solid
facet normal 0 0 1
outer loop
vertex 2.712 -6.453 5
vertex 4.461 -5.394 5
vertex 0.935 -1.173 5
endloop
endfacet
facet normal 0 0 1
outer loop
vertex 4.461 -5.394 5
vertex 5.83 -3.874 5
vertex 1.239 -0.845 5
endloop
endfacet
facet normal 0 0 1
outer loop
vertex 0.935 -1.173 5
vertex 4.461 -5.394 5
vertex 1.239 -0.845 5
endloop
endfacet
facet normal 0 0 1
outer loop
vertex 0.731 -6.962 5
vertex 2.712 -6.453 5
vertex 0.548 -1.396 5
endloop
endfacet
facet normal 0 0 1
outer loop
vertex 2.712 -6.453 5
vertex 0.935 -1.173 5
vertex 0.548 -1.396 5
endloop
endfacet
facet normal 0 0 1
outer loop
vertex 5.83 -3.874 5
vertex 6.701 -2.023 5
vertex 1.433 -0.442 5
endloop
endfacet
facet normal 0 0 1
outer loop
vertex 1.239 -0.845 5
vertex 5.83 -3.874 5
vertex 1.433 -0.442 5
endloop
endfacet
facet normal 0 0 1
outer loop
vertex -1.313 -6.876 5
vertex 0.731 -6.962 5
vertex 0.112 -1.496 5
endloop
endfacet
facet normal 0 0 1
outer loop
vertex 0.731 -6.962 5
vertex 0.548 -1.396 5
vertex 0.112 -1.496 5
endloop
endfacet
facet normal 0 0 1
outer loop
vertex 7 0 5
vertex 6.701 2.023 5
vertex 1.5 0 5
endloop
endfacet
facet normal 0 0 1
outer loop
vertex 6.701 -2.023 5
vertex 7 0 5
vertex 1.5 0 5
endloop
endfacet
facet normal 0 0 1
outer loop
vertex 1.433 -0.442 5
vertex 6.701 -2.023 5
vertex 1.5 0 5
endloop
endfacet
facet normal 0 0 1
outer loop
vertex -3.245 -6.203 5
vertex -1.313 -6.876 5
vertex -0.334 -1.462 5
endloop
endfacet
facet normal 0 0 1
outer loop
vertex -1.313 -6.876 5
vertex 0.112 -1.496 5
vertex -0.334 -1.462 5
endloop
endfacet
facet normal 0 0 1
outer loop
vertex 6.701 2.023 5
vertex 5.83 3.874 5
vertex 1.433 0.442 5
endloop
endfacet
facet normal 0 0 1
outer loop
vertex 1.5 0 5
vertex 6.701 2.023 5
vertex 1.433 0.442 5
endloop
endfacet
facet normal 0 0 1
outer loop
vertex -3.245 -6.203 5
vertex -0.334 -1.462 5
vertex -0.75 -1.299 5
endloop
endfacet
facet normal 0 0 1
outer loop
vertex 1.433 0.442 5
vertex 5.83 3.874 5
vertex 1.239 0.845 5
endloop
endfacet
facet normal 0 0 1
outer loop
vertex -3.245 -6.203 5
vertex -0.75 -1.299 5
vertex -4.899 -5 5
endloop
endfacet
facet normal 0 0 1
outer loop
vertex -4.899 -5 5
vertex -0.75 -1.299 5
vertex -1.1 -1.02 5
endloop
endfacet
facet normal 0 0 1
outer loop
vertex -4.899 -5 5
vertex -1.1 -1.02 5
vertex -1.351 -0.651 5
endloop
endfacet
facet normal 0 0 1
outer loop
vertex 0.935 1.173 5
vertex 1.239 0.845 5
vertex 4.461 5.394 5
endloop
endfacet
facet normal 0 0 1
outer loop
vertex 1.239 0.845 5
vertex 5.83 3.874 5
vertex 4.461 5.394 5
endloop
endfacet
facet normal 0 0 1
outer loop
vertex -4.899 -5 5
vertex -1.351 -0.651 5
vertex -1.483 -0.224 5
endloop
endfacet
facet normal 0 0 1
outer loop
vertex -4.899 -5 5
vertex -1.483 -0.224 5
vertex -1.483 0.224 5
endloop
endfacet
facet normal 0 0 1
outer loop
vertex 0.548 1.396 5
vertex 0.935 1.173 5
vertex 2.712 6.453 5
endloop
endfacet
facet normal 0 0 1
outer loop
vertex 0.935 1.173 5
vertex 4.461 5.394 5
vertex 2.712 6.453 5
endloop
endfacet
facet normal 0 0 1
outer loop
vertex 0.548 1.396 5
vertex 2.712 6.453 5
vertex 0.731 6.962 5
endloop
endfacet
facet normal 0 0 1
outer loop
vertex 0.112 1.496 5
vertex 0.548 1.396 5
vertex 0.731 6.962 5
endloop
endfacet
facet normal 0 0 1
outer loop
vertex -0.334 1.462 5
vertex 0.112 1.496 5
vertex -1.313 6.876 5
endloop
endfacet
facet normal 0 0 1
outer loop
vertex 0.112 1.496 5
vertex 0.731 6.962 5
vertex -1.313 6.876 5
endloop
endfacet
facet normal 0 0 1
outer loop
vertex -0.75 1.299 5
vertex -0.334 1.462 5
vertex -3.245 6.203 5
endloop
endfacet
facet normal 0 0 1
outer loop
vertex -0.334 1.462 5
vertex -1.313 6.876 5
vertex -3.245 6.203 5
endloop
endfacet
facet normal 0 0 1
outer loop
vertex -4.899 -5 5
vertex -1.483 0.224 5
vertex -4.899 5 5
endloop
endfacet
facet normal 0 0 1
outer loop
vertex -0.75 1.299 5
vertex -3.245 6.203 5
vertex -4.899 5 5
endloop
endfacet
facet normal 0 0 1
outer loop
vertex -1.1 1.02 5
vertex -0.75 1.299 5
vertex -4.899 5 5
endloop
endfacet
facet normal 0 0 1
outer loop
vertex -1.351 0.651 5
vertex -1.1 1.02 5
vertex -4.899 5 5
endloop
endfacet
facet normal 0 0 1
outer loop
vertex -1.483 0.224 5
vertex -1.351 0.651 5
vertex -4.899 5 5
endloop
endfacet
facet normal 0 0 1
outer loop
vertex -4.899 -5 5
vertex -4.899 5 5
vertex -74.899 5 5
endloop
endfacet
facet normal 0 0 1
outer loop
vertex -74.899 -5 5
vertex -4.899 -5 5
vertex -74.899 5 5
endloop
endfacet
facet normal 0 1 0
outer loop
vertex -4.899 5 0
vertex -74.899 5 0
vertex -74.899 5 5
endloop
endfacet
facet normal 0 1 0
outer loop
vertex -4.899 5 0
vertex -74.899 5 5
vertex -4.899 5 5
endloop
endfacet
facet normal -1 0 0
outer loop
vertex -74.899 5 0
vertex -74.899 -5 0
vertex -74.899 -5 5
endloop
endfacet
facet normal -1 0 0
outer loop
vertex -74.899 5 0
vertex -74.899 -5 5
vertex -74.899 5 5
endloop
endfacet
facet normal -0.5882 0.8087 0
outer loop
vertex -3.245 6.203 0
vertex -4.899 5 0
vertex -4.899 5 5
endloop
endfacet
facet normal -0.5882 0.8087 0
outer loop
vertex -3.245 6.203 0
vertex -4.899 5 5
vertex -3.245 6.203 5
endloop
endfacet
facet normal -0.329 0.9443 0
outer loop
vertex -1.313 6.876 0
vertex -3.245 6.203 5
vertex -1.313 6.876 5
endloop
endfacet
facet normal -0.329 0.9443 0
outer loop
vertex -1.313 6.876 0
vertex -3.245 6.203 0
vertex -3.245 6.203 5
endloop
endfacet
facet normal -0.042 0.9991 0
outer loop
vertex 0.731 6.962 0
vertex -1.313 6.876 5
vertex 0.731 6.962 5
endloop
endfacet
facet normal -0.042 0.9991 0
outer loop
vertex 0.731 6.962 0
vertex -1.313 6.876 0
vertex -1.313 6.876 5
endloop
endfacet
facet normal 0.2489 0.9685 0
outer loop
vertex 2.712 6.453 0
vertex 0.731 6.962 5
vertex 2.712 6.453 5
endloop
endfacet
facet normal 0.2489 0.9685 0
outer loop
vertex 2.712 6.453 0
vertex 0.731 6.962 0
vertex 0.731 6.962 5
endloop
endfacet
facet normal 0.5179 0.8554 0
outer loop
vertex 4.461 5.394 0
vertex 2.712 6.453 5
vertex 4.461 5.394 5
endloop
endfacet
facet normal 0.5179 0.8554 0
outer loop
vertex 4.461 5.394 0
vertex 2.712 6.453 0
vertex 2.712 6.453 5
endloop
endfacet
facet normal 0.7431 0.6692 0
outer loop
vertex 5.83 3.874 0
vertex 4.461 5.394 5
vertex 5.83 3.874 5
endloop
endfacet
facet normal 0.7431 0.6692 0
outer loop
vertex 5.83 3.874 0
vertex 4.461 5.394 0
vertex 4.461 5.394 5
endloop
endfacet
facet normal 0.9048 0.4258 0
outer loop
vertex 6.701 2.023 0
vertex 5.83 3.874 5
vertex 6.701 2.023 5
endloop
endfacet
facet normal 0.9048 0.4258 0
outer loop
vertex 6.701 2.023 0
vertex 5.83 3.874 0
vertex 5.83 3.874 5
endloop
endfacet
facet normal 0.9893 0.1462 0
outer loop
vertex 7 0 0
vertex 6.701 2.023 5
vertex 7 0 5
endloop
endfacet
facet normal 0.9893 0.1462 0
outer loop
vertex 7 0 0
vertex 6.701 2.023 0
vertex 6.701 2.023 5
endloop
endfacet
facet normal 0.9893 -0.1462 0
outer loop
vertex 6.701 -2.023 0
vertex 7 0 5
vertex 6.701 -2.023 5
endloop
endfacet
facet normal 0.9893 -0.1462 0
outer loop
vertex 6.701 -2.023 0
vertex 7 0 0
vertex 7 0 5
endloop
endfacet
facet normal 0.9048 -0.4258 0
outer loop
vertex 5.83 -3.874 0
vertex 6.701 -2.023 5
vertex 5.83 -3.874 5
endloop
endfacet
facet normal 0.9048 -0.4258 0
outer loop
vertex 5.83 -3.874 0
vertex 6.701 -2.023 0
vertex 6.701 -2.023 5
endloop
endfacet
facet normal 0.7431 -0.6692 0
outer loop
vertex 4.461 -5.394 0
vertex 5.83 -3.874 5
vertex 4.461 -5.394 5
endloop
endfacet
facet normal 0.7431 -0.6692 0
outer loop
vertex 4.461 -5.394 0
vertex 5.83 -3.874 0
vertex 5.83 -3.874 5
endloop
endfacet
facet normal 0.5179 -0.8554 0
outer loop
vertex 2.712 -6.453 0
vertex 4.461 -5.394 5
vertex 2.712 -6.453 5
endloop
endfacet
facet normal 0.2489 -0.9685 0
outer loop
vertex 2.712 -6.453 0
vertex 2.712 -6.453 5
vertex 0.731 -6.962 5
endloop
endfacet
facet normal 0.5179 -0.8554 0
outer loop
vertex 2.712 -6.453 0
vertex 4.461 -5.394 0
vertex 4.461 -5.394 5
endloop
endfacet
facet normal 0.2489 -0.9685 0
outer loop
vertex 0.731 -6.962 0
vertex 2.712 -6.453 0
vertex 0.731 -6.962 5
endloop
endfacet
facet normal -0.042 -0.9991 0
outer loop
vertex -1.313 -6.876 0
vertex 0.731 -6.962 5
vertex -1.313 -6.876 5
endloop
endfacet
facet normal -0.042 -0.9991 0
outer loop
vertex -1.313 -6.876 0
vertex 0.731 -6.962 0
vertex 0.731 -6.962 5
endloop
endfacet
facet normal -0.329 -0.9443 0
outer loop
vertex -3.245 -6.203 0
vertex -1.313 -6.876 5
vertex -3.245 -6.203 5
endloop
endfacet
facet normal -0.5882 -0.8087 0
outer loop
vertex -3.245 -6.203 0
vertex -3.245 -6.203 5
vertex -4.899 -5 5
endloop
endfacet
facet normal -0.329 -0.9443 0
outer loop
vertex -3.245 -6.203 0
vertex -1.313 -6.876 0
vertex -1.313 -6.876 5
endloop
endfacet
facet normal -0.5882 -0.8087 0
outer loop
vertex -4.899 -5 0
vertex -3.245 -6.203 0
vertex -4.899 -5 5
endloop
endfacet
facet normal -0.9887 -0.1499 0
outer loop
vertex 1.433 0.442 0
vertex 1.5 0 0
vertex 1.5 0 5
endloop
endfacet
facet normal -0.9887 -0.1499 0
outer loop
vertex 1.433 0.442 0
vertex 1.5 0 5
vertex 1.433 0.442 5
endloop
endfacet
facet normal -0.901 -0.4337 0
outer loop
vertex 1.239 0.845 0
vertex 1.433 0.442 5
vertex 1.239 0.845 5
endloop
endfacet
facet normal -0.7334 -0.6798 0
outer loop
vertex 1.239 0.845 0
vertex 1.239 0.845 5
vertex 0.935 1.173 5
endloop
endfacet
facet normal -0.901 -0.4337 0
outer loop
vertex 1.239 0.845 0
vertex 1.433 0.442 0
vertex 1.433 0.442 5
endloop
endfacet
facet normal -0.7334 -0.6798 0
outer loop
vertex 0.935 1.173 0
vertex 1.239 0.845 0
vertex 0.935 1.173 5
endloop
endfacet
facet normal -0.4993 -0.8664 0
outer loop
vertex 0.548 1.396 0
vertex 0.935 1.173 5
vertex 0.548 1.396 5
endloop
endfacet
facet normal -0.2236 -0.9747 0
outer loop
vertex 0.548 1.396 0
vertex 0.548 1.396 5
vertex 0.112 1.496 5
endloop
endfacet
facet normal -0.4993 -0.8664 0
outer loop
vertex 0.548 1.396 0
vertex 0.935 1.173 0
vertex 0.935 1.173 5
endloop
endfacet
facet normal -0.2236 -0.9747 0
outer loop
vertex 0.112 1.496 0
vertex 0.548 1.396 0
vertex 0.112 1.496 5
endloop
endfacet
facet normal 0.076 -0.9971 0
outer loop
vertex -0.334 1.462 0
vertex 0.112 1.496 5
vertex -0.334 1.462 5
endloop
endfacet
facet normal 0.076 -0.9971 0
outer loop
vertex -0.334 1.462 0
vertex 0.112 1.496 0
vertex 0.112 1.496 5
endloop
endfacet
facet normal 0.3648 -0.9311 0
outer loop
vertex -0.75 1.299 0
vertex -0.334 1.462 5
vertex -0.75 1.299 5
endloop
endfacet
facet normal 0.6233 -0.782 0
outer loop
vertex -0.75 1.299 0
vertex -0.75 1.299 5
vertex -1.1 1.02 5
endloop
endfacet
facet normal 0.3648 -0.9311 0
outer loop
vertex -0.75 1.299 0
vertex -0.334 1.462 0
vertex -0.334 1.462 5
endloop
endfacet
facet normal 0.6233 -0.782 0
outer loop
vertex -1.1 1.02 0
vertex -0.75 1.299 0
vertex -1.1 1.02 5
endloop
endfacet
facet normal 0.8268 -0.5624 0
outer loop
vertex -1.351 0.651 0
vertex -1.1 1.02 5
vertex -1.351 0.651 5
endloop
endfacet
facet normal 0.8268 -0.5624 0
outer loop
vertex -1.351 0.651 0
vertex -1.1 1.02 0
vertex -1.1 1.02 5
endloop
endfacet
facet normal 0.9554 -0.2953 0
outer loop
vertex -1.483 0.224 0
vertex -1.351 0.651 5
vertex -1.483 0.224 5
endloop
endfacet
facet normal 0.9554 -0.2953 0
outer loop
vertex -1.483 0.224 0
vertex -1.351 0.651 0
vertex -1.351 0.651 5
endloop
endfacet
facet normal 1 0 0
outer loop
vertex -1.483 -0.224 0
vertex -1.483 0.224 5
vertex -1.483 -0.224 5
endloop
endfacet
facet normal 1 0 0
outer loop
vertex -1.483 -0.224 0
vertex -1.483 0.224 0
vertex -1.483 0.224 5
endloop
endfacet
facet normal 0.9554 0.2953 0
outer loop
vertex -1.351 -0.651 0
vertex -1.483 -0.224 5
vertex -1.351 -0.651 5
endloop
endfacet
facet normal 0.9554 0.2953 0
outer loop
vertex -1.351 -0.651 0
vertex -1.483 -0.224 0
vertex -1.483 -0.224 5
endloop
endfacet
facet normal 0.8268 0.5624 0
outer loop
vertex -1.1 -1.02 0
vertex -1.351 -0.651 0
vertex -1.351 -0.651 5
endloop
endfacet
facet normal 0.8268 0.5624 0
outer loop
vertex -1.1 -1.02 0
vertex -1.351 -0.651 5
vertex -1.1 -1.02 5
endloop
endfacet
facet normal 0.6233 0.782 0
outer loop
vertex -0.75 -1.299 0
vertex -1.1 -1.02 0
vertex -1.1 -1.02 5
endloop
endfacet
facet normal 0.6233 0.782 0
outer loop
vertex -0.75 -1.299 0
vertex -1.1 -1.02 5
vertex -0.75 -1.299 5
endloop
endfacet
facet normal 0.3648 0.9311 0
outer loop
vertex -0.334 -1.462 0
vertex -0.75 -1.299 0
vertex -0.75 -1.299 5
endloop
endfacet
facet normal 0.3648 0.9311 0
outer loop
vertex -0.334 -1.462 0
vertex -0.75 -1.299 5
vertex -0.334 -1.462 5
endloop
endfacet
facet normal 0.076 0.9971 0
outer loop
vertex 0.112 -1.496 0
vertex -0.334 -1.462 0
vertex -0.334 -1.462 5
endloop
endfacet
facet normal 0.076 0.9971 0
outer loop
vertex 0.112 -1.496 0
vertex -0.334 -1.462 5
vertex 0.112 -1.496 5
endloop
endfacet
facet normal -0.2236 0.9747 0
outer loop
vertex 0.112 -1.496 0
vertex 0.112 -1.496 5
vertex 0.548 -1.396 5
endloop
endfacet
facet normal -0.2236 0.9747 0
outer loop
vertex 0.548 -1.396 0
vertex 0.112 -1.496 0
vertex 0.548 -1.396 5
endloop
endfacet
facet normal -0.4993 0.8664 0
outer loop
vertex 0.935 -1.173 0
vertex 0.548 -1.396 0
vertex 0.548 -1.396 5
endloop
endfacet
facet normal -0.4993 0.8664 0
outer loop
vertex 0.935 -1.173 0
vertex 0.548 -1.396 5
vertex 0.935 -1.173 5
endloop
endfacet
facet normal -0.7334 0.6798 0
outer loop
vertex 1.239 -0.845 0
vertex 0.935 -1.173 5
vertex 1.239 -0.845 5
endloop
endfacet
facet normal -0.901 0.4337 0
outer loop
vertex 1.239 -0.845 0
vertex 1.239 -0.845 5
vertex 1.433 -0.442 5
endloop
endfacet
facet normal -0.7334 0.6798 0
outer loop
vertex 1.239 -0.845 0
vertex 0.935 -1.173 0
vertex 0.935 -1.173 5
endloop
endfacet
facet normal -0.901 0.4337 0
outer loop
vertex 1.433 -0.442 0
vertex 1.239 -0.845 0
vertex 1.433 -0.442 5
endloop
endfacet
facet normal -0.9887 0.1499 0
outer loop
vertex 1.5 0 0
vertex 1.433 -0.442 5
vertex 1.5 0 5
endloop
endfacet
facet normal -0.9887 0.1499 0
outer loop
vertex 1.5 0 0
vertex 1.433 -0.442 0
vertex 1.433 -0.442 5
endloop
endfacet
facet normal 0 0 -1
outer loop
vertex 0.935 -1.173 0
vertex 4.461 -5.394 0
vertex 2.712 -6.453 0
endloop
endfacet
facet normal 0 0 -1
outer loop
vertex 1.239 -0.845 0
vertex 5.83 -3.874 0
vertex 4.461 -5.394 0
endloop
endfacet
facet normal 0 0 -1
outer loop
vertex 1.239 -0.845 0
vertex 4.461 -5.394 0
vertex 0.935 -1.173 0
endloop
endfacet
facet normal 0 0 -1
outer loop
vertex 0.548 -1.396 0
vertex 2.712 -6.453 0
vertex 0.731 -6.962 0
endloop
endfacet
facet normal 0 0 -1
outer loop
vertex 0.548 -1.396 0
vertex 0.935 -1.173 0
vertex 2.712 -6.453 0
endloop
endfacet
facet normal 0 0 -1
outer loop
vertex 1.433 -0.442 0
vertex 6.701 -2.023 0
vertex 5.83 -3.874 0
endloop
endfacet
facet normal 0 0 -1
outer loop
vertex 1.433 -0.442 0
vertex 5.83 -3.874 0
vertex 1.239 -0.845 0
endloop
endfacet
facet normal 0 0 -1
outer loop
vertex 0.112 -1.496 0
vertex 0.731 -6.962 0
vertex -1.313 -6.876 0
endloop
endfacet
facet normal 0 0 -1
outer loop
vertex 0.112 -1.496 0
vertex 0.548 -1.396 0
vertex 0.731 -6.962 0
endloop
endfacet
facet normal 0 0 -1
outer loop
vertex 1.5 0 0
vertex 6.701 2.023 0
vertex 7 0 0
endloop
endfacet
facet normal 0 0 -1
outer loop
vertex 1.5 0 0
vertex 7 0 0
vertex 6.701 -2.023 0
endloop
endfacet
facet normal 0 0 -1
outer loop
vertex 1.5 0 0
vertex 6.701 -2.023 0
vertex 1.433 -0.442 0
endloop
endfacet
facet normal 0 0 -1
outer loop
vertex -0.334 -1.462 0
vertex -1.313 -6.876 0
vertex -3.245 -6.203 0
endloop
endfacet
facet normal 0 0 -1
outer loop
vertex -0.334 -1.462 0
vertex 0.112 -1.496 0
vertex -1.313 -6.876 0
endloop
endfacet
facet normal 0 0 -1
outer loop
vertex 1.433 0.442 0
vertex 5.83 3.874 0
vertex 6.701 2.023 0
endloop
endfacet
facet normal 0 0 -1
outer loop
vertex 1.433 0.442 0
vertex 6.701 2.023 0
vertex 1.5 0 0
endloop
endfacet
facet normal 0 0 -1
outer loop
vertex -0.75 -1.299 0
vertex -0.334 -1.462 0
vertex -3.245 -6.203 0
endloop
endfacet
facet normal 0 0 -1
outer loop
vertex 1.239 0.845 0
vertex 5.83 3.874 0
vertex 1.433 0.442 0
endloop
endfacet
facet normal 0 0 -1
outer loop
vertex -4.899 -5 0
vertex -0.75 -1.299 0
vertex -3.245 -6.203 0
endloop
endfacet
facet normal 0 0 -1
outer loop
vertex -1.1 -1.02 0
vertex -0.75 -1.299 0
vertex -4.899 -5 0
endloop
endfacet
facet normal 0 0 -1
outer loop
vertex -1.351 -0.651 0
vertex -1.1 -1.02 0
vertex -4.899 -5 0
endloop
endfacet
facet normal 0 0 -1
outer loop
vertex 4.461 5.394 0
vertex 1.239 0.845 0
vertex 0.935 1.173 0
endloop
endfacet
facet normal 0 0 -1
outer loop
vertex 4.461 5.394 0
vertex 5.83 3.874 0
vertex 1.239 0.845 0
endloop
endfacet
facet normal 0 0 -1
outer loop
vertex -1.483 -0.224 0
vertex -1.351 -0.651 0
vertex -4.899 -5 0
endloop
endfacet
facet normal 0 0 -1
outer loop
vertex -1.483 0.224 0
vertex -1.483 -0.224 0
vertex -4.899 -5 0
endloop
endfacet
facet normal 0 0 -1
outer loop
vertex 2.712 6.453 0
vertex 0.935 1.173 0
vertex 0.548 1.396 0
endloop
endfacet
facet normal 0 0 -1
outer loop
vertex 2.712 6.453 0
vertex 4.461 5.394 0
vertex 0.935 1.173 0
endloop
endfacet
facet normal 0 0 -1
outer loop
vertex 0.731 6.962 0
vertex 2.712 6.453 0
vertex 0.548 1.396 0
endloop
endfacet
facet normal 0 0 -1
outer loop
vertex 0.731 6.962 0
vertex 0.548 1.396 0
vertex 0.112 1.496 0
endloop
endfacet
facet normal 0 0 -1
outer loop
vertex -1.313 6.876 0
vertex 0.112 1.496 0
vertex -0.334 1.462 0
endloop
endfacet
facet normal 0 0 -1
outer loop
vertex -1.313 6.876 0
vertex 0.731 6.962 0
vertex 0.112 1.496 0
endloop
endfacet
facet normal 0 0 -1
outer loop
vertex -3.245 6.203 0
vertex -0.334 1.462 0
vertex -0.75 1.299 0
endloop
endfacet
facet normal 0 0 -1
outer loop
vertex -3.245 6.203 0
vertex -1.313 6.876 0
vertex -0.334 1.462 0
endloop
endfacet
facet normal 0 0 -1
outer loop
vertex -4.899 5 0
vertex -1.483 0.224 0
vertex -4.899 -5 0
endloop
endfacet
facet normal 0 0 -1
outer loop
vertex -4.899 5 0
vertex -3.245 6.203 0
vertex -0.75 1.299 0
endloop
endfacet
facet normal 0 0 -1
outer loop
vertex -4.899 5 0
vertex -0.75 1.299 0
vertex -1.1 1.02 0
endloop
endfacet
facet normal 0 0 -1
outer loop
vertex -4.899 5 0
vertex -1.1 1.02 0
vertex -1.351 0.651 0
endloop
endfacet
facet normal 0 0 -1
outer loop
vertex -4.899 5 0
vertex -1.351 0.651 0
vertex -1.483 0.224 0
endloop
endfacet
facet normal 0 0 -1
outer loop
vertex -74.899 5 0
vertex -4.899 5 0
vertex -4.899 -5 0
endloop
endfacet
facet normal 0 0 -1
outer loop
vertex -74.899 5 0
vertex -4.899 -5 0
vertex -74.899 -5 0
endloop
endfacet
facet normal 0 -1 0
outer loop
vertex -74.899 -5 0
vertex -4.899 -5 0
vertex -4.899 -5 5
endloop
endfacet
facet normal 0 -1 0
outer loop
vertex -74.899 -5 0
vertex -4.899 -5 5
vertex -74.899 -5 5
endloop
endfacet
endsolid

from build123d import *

# Parameters (mm, degrees)
SKETCH1_R           = 1.5
BOSS_EXTRUDE1_DEPTH = 5


with BuildPart() as part:
    # Sketch1 → Boss-Extrude1 (new body)
    with BuildSketch(Plane.XY):
        with BuildLine():
            Line((-74.898979486, 5), (-4.898979486, 5))
            ThreePointArc((-4.898979486, 5), (7, 0), (-4.898979486, -5))
            Line((-4.898979486, -5), (-74.898979486, -5))
            Line((-74.898979486, -5), (-74.898979486, 5))
        make_face()
        Circle(SKETCH1_R, mode=Mode.SUBTRACT)
    extrude(amount=BOSS_EXTRUDE1_DEPTH)


solid = part.part
